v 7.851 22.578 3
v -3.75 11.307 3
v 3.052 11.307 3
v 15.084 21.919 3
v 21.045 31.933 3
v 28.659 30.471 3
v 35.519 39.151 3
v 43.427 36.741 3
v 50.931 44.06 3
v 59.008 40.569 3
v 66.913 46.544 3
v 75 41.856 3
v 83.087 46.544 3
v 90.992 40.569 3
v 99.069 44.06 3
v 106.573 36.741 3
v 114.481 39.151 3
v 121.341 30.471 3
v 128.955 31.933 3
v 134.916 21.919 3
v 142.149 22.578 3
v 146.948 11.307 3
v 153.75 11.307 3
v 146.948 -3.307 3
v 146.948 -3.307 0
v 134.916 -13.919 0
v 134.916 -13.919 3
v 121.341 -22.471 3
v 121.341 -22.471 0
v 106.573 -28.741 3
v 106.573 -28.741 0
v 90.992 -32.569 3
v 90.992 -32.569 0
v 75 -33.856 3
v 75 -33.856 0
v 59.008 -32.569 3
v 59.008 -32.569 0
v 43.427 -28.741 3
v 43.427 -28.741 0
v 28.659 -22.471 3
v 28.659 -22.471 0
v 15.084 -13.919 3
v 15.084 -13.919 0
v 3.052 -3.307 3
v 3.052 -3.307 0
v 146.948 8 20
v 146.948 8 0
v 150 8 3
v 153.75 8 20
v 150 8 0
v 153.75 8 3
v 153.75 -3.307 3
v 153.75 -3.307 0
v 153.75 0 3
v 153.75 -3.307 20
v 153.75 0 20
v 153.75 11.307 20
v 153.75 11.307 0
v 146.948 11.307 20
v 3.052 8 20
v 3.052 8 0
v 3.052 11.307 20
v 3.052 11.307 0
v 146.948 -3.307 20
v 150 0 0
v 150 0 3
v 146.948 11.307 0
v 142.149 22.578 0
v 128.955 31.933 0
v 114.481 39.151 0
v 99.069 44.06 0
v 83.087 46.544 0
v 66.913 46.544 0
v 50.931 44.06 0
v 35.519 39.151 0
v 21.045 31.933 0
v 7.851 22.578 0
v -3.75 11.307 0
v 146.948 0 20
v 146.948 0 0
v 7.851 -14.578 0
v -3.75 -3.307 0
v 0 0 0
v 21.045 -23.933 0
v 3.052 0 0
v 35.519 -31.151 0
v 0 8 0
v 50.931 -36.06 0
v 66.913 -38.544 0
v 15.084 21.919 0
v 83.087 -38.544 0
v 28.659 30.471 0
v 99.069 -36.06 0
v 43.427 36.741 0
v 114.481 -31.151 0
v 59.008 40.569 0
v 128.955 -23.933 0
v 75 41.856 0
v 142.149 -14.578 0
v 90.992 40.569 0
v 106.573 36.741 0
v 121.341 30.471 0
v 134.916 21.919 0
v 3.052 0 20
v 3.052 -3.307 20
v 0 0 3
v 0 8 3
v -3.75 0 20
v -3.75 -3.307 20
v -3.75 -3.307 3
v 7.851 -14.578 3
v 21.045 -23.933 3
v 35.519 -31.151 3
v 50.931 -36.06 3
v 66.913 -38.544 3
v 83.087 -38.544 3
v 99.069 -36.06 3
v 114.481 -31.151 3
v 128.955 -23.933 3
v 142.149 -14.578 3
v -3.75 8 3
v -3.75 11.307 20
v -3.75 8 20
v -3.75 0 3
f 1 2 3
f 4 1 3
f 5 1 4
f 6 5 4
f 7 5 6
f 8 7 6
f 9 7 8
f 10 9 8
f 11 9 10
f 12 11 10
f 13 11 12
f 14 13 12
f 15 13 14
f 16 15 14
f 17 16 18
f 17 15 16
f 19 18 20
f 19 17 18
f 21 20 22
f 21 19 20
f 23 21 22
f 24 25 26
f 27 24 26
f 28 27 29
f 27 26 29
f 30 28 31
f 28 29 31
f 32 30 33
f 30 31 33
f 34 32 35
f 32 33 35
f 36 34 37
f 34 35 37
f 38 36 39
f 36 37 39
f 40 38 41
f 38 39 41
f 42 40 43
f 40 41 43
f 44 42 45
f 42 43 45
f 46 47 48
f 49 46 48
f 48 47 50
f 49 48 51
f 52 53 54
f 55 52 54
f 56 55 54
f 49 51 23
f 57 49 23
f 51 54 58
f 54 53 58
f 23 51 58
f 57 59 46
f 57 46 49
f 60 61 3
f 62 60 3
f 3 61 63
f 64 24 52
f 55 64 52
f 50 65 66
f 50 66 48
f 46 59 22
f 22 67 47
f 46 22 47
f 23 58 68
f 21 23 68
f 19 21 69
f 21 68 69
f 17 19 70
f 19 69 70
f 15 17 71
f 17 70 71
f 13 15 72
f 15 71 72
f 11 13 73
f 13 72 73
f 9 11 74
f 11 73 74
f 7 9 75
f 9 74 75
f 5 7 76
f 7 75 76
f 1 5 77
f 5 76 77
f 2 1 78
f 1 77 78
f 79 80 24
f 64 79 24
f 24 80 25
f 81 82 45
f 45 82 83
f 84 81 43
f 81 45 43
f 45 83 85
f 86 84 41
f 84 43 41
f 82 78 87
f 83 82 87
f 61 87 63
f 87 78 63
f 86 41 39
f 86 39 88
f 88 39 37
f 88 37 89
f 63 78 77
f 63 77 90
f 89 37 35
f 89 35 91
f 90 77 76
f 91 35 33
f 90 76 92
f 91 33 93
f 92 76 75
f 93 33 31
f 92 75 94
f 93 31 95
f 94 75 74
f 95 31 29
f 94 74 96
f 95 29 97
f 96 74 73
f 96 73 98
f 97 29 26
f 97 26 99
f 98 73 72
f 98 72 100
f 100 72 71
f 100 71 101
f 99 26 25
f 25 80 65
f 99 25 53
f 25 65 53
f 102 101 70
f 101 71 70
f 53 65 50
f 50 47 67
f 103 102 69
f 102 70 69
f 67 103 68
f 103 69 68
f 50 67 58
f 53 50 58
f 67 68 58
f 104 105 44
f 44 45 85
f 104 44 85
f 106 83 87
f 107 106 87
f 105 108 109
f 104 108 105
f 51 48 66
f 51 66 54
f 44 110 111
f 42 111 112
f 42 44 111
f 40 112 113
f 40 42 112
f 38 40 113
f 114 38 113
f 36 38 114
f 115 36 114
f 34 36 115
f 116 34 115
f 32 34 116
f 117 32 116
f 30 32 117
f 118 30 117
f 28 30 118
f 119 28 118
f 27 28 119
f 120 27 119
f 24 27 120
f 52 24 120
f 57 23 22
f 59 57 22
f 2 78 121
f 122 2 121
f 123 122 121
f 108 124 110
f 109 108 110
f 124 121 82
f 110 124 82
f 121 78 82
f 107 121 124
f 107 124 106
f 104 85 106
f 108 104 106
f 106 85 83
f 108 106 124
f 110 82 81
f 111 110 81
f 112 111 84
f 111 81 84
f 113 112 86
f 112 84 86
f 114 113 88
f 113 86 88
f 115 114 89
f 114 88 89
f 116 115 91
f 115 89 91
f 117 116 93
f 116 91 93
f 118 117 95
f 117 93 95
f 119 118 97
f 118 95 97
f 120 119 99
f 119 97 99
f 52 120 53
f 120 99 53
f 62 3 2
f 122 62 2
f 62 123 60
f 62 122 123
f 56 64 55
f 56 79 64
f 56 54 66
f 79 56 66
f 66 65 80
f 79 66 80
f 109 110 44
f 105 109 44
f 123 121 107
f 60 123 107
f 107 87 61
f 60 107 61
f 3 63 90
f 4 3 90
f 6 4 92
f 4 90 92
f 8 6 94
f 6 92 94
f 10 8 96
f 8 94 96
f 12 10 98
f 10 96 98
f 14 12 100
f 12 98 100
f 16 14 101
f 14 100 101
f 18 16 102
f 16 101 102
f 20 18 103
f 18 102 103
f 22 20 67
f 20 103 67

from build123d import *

# Parameters (mm, degrees)
F0_W     = 3.75
F0_H     = 8
F1_DEPTH = 3
F2_DEPTH = 20


with BuildPart() as f1:
    # F0 (on Top) → F1 (new body)
    with BuildSketch(Plane.XY):
        with BuildLine():
            Line((-3.75, 11.307189), (3.051668, 11.307189))
            ThreePointArc((3.051668, 11.307189), (75, 41.856217), (146.948332, 11.307189))
            Line((146.948332, 11.307189), (153.75, 11.307189))
            ThreePointArc((153.75, 11.307189), (75, 46.856217), (-3.75, 11.307189))
        make_face()
        with BuildLine():
            ThreePointArc((146.948332, -3.307189), (75, -33.856217), (3.051668, -3.307189))
            Line((3.051668, -3.307189), (-3.75, -3.307189))
            ThreePointArc((-3.75, -3.307189), (75, -38.856217), (153.75, -3.307189))
            Line((153.75, -3.307189), (146.948332, -3.307189))
        make_face()
        with Locations((151.875, 4)):
            Rectangle(F0_W, F0_H)
        with Locations((-1.875, 4)):
            Rectangle(F0_W, F0_H)
    extrude(amount=F1_DEPTH)

    # F0 (on Top) → F2 (join)
    with BuildSketch(Plane.XY):
        with BuildLine():
            Line((-3.75, 8), (0, 8))
            ThreePointArc((0, 8), (1.507229, 9.670762), (3.051668, 11.307189))
            Line((3.051668, 11.307189), (-3.75, 11.307189))
            Line((-3.75, 11.307189), (-3.75, 8))
        make_face()
        with BuildLine():
            ThreePointArc((3.051668, 11.307189), (1.507229, 9.670762), (0, 8))
            Line((0, 8), (3.051668, 8))
            Line((3.051668, 8), (3.051668, 11.307189))
        make_face()
        with BuildLine():
            ThreePointArc((3.051668, -3.307189), (1.507229, -1.670762), (0, 0))
            Line((0, 0), (-3.75, 0))
            Line((-3.75, 0), (-3.75, -3.307189))
            Line((-3.75, -3.307189), (3.051668, -3.307189))
        make_face()
        with BuildLine():
            Line((3.051668, 0), (0, 0))
            ThreePointArc((0, 0), (1.507229, -1.670762), (3.051668, -3.307189))
            Line((3.051668, -3.307189), (3.051668, 0))
        make_face()
        with BuildLine():
            Line((153.75, 11.307189), (146.948332, 11.307189))
            ThreePointArc((146.948332, 11.307189), (148.492771, 9.670762), (150, 8))
            Line((150, 8), (153.75, 8))
            Line((153.75, 8), (153.75, 11.307189))
        make_face()
        with BuildLine():
            ThreePointArc((150, 8), (148.492771, 9.670762), (146.948332, 11.307189))
            Line((146.948332, 11.307189), (146.948332, 8))
            Line((146.948332, 8), (150, 8))
        make_face()
        with BuildLine():
            ThreePointArc((150, 0), (148.492771, -1.670762), (146.948332, -3.307189))
            Line((146.948332, -3.307189), (153.75, -3.307189))
            Line((153.75, -3.307189), (153.75, 0))
            Line((153.75, 0), (150, 0))
        make_face()
        with BuildLine():
            Line((146.948332, 0), (146.948332, -3.307189))
            ThreePointArc((146.948332, -3.307189), (148.492771, -1.670762), (150, 0))
            Line((150, 0), (146.948332, 0))
        make_face()
    extrude(amount=F2_DEPTH)


solid = f1.part
